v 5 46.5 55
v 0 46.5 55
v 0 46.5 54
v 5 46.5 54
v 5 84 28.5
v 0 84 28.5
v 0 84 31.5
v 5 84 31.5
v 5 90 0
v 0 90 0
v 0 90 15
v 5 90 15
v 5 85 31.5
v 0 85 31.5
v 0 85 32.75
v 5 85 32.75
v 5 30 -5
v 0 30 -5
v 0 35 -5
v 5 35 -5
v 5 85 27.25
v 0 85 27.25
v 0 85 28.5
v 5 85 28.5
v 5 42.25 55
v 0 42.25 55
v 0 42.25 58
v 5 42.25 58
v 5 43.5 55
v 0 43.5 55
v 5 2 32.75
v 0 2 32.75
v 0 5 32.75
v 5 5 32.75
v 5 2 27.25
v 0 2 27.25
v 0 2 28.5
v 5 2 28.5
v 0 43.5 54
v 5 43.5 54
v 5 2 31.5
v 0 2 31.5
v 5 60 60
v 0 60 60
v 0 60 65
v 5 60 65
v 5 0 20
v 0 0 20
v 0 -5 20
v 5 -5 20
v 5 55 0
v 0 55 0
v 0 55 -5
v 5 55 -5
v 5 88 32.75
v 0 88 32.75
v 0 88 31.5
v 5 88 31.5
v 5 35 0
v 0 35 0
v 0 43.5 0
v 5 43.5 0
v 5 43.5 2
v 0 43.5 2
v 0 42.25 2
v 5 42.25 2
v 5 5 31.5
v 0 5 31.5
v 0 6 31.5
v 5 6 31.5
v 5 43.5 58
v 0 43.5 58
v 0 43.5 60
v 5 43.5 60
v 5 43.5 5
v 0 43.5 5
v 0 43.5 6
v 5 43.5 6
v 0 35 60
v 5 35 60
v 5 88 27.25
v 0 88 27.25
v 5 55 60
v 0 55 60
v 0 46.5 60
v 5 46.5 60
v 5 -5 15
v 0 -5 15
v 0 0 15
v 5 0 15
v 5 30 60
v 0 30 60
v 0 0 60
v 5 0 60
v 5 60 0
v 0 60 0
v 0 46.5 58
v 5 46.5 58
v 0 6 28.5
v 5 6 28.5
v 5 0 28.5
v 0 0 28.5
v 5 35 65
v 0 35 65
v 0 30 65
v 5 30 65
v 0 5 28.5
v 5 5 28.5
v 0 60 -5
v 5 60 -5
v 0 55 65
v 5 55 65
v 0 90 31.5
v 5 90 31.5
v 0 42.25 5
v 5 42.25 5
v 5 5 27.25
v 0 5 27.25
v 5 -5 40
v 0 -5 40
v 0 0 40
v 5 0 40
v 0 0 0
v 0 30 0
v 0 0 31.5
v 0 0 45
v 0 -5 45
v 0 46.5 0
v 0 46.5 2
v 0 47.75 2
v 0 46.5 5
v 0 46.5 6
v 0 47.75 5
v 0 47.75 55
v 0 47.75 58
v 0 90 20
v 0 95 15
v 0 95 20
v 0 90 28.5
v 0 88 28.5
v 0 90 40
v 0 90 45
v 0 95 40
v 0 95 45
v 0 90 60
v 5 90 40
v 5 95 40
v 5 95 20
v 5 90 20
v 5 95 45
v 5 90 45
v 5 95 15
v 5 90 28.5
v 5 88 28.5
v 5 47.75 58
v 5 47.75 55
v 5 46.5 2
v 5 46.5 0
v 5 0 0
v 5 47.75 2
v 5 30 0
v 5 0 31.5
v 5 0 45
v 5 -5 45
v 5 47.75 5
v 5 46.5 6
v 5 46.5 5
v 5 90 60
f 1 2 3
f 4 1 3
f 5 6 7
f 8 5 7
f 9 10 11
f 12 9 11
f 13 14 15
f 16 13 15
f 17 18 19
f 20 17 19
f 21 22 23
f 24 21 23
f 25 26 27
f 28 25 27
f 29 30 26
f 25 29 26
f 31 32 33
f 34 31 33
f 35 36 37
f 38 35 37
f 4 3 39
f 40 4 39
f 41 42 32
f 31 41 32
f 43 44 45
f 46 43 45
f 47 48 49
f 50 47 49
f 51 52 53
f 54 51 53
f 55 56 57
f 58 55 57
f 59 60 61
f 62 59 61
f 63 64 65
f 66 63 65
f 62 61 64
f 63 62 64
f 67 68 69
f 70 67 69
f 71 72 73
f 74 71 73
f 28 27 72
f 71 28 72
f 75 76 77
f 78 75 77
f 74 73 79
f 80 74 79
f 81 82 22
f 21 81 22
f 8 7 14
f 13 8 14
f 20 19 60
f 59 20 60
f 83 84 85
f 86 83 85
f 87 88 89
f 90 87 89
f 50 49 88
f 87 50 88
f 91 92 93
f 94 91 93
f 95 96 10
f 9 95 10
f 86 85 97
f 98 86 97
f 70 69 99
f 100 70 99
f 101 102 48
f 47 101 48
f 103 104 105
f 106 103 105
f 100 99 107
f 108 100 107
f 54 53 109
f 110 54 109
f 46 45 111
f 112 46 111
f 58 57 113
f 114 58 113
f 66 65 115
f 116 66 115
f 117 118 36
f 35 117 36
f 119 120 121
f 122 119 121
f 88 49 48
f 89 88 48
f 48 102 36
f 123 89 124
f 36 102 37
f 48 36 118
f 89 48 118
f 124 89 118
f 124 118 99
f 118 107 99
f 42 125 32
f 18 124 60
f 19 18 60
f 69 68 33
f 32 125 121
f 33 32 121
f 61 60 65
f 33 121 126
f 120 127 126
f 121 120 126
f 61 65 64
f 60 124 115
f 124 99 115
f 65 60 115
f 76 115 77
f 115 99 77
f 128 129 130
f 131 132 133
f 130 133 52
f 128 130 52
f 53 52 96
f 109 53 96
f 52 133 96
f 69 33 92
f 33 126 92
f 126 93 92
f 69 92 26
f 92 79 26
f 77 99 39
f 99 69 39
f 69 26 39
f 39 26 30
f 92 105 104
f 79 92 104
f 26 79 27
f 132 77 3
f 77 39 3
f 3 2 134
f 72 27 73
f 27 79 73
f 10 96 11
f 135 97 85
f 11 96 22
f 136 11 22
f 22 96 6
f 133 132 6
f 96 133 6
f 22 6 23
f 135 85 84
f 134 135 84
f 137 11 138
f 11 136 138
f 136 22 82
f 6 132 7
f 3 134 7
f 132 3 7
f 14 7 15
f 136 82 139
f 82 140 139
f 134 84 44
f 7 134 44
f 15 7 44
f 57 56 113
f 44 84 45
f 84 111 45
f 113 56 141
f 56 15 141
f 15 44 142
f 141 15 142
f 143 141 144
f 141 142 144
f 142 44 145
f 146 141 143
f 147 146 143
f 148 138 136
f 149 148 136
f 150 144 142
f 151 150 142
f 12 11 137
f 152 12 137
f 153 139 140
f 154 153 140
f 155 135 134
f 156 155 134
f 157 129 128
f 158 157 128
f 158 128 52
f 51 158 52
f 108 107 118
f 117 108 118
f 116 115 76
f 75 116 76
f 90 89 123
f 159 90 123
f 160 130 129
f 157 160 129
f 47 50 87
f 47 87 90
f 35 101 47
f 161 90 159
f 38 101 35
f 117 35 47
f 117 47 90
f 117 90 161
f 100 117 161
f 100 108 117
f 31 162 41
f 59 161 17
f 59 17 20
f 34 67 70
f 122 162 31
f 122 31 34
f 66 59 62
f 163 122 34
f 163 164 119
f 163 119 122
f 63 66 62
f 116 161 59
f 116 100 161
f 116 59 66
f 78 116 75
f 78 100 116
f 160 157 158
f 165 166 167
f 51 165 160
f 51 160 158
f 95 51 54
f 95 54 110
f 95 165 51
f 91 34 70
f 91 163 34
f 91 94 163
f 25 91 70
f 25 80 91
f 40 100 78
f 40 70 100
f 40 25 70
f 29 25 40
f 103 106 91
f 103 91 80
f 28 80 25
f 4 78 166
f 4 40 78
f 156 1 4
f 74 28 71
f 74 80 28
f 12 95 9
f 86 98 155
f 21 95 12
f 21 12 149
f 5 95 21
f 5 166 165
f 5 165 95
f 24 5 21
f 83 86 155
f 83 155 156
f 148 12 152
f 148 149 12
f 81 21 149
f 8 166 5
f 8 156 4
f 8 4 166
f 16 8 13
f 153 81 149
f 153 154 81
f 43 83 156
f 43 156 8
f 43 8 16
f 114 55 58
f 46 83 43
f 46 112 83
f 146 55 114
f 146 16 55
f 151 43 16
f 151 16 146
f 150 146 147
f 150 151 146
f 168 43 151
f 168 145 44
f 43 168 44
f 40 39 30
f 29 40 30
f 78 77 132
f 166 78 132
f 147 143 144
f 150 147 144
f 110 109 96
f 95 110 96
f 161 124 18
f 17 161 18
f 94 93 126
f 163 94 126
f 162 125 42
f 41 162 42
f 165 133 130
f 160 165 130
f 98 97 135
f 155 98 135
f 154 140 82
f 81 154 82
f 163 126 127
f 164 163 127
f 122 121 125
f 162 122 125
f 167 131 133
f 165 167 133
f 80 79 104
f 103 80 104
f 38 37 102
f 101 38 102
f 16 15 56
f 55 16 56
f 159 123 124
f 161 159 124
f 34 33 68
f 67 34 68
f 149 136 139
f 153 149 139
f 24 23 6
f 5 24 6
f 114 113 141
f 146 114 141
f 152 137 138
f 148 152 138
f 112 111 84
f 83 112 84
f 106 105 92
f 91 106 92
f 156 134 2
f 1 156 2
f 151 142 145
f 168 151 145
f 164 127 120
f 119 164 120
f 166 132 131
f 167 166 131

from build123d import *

# Parameters (mm, degrees)
F2_DEPTH = 5


with BuildPart() as f2:
    # F1 (on Right) → F2 (new body)
    with BuildSketch(Plane.YZ):
        Polygon((0, 15), (0, 0), (30, 0), (30, -5), (35, -5), (35, 0), (43.5, 0), (43.5, 2), (42.25, 2), (42.25, 5), (43.5, 5), (43.5, 6), (46.5, 6), (46.5, 5), (47.75, 5), (47.75, 2), (46.5, 2), (46.5, 0), (55, 0), (55, -5), (60, -5), (60, 0), (90, 0), (90, 15), (95, 15), (95, 20), (90, 20), (90, 28.5), (88, 28.5), (88, 27.25), (85, 27.25), (85, 28.5), (84, 28.5), (84, 31.5), (85, 31.5), (85, 32.75), (88, 32.75), (88, 31.5), (90, 31.5), (90, 40), (95, 40), (95, 45), (90, 45), (90, 60), (60, 60), (60, 65), (55, 65), (55, 60), (46.5, 60), (46.5, 58), (47.75, 58), (47.75, 55), (46.5, 55), (46.5, 54), (43.5, 54), (43.5, 55), (42.25, 55), (42.25, 58), (43.5, 58), (43.5, 60), (35, 60), (35, 65), (30, 65), (30, 60), (0, 60), (0, 45), (-5, 45), (-5, 40), (0, 40), (0, 31.5), (2, 31.5), (2, 32.75), (5, 32.75), (5, 31.5), (6, 31.5), (6, 28.5), (5, 28.5), (5, 27.25), (2, 27.25), (2, 28.5), (0, 28.5), (0, 20), (-5, 20), (-5, 15), align=None)
    extrude(amount=F2_DEPTH)


solid = f2.part
